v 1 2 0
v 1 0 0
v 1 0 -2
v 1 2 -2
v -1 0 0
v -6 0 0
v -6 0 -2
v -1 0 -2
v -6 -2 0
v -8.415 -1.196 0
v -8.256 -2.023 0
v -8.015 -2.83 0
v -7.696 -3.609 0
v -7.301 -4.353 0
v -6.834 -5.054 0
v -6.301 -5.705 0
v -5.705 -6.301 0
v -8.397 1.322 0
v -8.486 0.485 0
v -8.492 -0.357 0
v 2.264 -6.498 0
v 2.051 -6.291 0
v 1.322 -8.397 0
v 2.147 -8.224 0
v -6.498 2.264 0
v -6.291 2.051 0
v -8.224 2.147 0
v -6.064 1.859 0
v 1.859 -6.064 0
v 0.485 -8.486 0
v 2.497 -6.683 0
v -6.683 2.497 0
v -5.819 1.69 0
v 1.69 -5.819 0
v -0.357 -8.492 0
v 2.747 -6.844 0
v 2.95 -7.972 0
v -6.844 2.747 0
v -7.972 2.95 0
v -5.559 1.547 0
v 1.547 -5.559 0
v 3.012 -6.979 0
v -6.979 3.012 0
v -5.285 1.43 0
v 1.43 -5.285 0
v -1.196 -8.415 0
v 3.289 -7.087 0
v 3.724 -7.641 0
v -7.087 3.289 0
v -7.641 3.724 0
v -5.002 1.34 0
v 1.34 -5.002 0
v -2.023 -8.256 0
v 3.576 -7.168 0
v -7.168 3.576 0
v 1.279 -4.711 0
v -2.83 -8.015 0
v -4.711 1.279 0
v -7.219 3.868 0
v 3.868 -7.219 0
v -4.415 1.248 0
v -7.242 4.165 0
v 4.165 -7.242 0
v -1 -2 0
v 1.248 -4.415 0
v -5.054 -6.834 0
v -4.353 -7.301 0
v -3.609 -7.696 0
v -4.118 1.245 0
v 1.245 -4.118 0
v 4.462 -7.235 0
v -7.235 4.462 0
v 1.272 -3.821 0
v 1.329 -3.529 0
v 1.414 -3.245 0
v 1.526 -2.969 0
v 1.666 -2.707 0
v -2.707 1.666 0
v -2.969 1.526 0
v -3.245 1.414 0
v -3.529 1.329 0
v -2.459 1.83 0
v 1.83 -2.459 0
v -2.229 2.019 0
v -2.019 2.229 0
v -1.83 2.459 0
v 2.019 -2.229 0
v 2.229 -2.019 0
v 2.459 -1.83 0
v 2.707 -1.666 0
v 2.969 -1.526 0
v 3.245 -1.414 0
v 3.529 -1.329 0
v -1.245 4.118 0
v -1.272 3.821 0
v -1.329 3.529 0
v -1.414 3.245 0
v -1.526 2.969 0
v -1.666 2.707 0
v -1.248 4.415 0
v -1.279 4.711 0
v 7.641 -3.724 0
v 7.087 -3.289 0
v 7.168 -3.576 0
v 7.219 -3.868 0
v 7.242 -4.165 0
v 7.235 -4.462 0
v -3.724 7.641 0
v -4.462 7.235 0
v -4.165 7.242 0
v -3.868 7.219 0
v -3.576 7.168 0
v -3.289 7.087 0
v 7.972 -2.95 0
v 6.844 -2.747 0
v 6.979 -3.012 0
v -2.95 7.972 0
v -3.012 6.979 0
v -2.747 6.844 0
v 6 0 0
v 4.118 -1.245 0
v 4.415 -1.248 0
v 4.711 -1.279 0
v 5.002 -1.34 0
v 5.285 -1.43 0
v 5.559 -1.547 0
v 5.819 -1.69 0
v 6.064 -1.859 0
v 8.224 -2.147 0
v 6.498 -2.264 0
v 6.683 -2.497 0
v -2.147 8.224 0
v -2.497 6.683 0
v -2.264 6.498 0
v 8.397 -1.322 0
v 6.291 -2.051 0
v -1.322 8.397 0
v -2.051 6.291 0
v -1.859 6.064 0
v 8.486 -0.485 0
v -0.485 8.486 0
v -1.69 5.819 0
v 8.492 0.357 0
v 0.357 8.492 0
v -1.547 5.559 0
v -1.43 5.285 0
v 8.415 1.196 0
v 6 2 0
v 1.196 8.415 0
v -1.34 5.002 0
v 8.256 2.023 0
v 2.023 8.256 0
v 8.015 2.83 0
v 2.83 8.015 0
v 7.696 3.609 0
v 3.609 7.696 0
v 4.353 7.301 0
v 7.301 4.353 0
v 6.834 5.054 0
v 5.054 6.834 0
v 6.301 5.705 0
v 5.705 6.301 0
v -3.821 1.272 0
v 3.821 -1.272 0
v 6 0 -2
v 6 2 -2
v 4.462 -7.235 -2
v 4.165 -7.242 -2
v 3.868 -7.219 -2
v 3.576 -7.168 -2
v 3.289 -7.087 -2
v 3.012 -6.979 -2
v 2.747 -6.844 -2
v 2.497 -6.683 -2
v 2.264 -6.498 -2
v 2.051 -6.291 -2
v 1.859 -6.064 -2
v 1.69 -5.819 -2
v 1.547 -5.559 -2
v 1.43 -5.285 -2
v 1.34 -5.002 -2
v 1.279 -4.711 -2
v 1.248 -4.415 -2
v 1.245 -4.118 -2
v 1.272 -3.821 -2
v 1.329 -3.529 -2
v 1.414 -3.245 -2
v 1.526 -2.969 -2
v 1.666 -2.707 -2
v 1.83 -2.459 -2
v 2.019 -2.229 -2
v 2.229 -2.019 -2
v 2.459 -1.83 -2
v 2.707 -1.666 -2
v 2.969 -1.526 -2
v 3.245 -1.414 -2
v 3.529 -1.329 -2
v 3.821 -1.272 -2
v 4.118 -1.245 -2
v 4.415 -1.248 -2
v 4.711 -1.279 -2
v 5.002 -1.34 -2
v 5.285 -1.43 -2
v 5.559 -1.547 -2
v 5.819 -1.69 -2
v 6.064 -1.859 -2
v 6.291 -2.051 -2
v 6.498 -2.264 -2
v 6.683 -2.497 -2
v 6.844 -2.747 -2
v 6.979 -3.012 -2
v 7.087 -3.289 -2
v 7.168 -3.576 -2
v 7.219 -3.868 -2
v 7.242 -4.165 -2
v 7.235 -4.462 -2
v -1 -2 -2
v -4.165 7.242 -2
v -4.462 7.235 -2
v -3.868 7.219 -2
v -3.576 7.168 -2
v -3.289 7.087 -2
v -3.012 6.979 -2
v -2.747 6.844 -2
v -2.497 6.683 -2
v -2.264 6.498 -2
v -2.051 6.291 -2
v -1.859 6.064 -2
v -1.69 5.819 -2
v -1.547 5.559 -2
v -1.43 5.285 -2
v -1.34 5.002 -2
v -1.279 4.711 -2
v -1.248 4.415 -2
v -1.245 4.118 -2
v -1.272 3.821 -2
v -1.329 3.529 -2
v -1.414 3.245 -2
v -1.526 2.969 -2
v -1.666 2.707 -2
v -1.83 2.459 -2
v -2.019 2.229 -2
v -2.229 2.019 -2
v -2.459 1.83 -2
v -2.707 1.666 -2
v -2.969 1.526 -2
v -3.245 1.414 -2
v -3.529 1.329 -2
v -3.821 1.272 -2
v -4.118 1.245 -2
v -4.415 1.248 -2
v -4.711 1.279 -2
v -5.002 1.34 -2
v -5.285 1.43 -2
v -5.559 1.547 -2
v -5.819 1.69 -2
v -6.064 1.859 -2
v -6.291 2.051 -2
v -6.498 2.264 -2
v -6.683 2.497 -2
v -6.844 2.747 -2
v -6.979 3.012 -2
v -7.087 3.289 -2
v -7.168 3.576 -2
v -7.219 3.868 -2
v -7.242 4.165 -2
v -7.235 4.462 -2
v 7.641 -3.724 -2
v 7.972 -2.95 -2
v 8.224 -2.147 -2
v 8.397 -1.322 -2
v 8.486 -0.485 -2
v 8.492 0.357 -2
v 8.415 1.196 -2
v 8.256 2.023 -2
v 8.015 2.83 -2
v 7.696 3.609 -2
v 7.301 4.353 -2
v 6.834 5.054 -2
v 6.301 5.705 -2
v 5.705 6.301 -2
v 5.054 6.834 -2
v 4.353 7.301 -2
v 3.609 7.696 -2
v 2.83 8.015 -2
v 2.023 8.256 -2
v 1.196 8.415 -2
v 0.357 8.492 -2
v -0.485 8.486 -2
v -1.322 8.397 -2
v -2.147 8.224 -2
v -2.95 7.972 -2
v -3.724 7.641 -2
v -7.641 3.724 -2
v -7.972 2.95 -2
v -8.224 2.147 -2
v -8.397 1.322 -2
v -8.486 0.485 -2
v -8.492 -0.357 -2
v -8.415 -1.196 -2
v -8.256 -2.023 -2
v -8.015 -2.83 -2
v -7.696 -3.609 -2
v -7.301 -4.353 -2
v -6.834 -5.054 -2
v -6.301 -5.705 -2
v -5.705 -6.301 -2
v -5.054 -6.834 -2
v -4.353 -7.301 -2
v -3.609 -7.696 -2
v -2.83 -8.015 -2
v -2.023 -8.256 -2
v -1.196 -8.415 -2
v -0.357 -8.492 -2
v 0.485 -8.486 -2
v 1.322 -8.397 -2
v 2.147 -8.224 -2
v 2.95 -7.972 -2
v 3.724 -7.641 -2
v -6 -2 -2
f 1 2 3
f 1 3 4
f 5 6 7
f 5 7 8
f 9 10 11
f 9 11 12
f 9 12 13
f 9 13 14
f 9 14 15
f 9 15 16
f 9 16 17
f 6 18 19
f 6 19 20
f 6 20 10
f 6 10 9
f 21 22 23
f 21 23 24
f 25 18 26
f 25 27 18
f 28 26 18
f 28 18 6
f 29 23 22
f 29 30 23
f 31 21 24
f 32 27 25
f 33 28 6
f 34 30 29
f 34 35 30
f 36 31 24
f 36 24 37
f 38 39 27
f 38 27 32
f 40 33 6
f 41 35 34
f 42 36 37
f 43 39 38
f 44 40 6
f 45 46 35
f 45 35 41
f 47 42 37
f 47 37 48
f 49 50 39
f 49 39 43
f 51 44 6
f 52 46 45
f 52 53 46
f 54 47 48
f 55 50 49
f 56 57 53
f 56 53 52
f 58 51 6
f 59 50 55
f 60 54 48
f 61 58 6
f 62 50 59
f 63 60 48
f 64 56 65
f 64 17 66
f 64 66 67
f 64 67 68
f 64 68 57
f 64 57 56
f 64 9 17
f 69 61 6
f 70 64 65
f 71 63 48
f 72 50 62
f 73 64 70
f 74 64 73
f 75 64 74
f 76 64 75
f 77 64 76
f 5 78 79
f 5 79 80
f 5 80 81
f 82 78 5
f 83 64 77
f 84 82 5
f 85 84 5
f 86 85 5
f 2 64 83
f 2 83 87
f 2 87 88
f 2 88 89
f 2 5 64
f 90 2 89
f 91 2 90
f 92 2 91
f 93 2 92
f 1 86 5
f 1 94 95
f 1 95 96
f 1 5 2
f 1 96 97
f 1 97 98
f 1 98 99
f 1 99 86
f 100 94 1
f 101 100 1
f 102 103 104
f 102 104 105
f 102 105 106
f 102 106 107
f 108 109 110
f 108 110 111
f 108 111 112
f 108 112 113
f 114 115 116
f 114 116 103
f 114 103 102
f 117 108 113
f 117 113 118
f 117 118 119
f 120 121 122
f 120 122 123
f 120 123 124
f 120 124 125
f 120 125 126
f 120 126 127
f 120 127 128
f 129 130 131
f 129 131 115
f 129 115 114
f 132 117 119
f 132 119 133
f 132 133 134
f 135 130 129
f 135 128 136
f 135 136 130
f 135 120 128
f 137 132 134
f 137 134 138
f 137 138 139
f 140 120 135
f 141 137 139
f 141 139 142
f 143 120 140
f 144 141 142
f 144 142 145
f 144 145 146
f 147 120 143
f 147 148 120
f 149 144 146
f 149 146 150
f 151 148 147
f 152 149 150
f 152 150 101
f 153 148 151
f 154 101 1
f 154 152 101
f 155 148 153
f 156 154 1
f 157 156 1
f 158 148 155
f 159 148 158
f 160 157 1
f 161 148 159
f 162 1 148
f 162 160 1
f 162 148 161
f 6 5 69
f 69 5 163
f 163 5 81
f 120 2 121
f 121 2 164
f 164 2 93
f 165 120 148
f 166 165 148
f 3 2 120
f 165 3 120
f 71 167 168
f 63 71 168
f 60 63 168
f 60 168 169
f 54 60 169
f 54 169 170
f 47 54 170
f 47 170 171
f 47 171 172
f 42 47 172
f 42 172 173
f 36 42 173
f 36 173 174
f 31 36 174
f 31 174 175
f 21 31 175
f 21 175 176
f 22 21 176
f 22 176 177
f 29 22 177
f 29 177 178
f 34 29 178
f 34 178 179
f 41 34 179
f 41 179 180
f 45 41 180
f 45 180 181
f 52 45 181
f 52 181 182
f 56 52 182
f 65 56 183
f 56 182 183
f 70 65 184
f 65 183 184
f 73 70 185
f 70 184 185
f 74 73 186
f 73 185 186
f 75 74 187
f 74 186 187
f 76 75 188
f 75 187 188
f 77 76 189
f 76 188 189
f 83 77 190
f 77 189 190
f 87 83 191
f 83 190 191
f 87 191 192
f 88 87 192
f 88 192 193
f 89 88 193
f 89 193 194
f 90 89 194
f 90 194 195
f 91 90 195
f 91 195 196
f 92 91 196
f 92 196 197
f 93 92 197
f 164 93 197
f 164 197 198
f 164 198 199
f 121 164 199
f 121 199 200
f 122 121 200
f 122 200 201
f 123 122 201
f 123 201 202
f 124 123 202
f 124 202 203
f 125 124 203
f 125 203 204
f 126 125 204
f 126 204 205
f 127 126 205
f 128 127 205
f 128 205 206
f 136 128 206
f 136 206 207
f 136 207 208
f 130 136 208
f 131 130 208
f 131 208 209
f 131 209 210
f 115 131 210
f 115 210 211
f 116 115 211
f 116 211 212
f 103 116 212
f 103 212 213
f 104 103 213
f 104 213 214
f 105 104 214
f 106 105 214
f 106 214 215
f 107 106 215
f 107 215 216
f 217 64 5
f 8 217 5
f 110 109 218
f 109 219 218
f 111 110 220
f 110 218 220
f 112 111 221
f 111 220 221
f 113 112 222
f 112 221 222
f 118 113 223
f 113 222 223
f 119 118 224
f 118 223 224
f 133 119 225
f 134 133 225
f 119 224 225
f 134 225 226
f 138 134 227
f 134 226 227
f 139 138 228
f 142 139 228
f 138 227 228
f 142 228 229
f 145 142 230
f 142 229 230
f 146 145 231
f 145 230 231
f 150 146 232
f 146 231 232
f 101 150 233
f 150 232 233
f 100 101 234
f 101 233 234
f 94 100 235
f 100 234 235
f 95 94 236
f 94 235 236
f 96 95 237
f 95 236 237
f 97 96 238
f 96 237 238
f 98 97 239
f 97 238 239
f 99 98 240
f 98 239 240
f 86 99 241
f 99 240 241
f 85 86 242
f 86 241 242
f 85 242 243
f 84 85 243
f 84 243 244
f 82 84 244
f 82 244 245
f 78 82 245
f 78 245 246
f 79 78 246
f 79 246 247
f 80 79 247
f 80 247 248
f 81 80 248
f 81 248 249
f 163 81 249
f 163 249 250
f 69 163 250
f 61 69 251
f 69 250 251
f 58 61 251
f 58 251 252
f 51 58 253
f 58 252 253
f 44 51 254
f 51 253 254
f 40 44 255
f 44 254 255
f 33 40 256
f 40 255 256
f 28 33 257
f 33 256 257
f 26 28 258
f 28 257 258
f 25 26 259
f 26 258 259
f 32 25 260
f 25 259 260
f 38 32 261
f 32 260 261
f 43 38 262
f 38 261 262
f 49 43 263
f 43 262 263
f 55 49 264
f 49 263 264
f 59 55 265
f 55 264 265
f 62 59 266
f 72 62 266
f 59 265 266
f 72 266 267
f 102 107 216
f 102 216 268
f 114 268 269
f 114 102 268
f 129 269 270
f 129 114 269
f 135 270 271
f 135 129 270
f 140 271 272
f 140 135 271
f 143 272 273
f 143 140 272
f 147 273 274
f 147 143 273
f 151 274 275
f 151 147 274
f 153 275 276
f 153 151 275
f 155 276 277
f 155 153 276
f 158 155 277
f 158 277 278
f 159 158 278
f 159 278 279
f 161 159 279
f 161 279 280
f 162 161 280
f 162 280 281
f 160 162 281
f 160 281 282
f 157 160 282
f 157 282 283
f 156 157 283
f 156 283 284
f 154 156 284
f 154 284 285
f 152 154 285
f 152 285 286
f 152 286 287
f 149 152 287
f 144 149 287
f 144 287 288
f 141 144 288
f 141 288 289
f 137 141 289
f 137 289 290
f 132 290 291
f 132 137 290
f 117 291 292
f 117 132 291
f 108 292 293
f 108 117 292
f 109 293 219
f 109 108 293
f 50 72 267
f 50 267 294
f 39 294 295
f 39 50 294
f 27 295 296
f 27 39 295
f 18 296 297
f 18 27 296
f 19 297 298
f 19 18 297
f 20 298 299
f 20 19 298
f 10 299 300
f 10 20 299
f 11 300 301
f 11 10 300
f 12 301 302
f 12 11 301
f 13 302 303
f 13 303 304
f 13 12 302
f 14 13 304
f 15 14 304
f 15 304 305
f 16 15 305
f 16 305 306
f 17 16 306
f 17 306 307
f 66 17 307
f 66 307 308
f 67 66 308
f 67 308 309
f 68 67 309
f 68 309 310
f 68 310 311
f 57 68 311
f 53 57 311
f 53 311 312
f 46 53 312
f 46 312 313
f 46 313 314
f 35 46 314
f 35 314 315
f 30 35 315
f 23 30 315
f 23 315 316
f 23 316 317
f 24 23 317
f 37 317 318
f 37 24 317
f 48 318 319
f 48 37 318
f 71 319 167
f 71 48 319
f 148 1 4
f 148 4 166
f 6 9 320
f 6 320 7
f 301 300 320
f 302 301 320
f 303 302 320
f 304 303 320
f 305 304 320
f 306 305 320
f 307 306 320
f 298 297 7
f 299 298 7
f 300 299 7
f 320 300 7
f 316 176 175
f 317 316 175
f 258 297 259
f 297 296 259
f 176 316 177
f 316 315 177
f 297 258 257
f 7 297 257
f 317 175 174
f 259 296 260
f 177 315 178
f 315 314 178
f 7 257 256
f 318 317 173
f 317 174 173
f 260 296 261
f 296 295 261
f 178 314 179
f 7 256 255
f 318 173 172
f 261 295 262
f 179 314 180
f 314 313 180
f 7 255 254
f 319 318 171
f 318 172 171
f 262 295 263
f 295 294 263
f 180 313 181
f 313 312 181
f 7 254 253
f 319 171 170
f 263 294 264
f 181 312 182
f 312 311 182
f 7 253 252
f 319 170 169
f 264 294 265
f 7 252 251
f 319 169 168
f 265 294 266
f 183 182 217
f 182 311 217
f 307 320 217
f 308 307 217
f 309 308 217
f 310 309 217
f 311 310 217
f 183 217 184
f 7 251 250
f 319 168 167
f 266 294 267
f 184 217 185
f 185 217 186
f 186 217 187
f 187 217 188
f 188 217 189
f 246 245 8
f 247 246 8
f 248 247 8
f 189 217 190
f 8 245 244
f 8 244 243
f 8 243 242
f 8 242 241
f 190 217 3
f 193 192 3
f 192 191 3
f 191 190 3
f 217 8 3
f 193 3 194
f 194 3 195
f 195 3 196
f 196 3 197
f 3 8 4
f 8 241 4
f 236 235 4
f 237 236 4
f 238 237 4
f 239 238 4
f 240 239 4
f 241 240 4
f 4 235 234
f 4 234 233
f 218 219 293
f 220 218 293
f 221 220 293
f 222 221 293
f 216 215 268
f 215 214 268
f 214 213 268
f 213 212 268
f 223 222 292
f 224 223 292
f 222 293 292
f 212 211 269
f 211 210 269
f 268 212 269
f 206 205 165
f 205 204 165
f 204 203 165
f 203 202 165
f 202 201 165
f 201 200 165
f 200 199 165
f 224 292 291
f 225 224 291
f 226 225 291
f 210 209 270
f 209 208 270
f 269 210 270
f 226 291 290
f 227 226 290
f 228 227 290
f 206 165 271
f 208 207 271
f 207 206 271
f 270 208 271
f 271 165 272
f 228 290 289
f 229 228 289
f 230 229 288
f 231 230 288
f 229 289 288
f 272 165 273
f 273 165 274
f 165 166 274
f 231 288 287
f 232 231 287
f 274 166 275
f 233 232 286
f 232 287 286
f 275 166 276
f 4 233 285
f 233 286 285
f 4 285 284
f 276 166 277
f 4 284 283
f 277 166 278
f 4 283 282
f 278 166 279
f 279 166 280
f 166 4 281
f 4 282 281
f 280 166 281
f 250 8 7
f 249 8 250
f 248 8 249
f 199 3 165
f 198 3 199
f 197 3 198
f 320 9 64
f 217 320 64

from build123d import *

# Parameters (mm, degrees)
F0_R     = 8.5
F1_DEPTH = 2
F3_D     = 6
F4_W     = 5
F4_H     = 2
F5_DEPTH = 2.001


with BuildPart() as f1:
    # F0 (on Top) → F1 (new body)
    with BuildSketch(Plane.XY):
        Circle(F0_R)
    extrude(amount=-F1_DEPTH)

    # F3 (through all)
    with Locations(Plane.XY):
        with Locations((4.242641, -4.242641), (-4.242641, 4.242641)):
            Hole(F3_D / 2)

    # F4 (on face) → F5 (cut, through all)
    with BuildSketch(Plane.XY):
        with Locations((-3.5, -1)):
            Rectangle(F4_W, F4_H)
        with Locations((3.5, 1)):
            Rectangle(F4_W, F4_H)
    extrude(amount=-F5_DEPTH, mode=Mode.SUBTRACT)


solid = f1.part
